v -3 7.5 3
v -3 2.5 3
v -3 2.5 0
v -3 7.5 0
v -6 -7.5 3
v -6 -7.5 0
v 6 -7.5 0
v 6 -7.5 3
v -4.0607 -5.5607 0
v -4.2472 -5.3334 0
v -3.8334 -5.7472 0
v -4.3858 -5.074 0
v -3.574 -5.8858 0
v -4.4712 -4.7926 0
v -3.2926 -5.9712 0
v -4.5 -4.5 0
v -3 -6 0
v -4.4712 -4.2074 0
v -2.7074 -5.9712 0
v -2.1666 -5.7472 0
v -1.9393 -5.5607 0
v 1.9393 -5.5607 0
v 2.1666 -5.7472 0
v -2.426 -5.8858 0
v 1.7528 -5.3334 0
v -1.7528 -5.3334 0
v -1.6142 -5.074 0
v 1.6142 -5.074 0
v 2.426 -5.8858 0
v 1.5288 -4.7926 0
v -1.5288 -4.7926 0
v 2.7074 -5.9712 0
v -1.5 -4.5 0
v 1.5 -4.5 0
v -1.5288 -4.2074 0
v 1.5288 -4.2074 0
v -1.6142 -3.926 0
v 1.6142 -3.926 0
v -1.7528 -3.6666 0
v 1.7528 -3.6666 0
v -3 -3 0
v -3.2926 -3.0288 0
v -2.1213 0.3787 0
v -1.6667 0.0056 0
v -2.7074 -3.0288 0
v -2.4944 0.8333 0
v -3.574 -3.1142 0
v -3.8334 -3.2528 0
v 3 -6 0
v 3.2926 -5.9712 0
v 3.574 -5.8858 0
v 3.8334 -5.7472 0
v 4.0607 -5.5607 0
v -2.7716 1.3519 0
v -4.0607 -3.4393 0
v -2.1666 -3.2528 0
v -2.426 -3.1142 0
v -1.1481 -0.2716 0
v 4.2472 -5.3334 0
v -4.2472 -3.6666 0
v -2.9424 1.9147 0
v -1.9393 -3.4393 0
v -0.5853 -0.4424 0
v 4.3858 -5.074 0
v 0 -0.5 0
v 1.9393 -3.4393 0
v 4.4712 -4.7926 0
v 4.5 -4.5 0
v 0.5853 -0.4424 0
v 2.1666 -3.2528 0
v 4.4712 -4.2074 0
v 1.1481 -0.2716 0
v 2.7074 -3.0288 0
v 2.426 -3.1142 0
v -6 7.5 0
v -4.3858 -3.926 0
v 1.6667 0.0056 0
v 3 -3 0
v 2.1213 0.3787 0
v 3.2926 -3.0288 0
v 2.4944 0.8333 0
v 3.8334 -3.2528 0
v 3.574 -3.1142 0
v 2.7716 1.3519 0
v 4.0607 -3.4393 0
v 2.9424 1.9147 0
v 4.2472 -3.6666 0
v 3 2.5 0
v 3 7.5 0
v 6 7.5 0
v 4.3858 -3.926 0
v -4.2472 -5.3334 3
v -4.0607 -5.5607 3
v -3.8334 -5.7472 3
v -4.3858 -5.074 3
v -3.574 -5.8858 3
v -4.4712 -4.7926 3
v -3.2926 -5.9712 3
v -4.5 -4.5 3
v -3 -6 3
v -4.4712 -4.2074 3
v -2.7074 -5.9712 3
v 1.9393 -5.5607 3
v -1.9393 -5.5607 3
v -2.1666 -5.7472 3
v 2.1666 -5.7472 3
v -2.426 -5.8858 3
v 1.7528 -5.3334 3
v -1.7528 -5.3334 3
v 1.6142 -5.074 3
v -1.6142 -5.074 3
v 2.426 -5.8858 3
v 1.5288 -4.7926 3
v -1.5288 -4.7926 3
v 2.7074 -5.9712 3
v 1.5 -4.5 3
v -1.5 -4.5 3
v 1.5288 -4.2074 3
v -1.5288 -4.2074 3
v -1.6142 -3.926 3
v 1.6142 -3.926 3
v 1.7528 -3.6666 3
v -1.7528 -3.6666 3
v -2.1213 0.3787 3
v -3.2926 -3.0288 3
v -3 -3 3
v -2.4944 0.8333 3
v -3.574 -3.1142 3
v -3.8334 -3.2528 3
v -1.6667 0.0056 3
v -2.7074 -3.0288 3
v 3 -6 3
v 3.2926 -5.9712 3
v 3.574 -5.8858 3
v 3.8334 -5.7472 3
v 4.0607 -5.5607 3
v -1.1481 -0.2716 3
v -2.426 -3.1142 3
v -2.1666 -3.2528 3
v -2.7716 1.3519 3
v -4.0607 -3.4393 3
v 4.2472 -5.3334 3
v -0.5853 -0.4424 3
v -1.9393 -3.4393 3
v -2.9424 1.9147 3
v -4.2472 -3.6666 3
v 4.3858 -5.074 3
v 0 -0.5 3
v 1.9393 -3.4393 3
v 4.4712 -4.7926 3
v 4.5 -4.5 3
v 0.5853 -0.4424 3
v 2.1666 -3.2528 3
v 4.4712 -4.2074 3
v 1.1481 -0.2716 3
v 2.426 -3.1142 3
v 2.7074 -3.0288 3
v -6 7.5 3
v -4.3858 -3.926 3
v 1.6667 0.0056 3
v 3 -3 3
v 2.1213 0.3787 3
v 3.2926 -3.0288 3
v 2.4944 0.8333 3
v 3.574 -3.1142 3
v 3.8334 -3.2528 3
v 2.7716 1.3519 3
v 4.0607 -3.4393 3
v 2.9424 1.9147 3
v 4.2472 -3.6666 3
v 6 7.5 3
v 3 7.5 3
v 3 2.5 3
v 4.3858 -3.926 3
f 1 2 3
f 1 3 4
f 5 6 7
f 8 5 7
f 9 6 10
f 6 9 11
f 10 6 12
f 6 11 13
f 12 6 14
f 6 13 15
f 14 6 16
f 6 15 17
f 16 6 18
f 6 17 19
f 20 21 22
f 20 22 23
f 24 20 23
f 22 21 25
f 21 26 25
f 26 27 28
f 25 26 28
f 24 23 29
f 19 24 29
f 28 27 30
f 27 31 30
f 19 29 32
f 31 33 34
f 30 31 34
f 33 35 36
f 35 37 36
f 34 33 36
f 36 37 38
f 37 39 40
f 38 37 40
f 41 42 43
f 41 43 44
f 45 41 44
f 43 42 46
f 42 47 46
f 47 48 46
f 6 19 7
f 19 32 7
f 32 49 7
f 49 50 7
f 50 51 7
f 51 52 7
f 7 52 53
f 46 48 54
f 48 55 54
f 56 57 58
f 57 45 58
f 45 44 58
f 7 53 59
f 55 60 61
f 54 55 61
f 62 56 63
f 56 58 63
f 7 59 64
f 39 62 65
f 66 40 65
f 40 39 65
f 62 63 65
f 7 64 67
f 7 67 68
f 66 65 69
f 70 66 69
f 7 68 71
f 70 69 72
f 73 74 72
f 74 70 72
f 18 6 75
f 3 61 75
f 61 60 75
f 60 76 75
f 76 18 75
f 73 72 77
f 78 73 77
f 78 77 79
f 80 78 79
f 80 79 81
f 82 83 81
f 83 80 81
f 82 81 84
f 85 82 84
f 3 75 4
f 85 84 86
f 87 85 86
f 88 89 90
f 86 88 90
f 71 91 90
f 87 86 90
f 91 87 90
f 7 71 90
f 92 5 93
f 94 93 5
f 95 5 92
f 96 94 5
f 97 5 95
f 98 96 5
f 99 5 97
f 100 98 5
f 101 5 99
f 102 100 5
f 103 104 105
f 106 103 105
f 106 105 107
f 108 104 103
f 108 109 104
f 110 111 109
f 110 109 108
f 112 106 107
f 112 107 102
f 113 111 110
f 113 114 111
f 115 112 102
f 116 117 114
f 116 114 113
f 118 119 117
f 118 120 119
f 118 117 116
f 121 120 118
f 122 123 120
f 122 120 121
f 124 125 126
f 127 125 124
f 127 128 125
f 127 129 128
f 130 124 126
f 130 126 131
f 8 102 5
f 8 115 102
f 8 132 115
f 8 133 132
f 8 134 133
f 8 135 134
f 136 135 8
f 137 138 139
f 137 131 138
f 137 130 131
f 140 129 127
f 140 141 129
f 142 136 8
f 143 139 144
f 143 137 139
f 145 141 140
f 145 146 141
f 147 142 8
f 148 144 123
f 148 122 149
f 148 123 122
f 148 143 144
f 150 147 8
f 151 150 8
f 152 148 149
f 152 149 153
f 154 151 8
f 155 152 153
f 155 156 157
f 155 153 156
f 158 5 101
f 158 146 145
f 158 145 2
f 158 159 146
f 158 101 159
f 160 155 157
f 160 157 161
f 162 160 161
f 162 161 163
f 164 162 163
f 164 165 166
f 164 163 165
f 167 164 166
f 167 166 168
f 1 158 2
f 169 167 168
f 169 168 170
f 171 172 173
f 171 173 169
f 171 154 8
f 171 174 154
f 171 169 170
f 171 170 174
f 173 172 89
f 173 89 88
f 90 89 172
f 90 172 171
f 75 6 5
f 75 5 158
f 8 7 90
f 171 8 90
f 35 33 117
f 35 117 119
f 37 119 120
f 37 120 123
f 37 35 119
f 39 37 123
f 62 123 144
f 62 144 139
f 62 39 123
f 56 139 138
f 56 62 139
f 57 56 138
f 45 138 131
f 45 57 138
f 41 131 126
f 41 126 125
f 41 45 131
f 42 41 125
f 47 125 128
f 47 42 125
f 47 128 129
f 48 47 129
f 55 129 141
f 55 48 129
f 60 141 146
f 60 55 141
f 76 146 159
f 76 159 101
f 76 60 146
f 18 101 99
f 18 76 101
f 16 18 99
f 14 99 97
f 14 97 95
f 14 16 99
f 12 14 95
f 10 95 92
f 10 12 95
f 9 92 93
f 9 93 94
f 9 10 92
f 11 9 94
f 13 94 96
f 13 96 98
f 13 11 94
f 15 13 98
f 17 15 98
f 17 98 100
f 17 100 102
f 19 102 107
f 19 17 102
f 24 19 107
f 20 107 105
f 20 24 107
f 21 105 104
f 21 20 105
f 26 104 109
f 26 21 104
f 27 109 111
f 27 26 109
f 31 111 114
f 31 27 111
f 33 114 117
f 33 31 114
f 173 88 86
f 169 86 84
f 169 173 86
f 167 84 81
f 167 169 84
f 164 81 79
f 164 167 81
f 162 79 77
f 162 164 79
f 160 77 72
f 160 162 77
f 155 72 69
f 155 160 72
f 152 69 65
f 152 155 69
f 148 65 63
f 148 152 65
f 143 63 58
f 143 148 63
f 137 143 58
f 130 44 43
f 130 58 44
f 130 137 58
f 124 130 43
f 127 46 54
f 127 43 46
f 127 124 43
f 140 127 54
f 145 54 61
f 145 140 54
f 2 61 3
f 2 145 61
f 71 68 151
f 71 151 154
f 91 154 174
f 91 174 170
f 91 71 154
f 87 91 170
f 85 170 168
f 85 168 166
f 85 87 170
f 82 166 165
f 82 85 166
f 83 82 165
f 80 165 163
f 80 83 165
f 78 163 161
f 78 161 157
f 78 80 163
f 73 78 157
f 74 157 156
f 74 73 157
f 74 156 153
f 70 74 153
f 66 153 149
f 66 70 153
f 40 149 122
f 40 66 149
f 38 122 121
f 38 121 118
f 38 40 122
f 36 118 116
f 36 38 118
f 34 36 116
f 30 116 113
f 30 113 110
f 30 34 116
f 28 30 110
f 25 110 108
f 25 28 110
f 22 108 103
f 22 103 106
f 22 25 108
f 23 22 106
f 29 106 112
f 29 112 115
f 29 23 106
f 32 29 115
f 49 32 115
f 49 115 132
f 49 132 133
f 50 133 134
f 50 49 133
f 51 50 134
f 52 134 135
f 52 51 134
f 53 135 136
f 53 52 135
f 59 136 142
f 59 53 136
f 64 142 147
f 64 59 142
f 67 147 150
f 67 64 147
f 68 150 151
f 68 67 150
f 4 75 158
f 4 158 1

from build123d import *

# Parameters (mm, degrees)
SKETCH1_W           = 12
SKETCH1_H           = 15
SKETCH1_R           = 1.5
BOSS_EXTRUDE1_DEPTH = 3
CUT_EXTRUDE1_REACH  = 12.062


with BuildPart() as part:
    # Sketch1 → Boss-Extrude1 (new body)
    with BuildSketch(Plane.XY):
        Rectangle(SKETCH1_W, SKETCH1_H)
        with Locations((-3, -4.5)):
            Circle(SKETCH1_R, mode=Mode.SUBTRACT)
        with Locations((3, -4.5)):
            Circle(SKETCH1_R, mode=Mode.SUBTRACT)
    extrude(amount=BOSS_EXTRUDE1_DEPTH)

    # Sketch2 → Cut-Extrude1 (cut, up to next)
    with BuildSketch(Plane.XY.offset(3), mode=Mode.PRIVATE) as cut_extrude1_sk1:
        with BuildLine():
            Line((-3, 7.5), (3, 7.5))
            Line((3, 7.5), (3, 2.5))
            ThreePointArc((3, 2.5), (0, -0.5), (-3, 2.5))
            Line((-3, 2.5), (-3, 7.5))
        make_face()
    cut_extrude1_tool1 = extrude(cut_extrude1_sk1.sketch, amount=-CUT_EXTRUDE1_REACH, mode=Mode.PRIVATE) & part.part
    add(cut_extrude1_tool1.solids().sort_by_distance((0, 3.791429, 3))[0], mode=Mode.SUBTRACT)


solid = part.part
